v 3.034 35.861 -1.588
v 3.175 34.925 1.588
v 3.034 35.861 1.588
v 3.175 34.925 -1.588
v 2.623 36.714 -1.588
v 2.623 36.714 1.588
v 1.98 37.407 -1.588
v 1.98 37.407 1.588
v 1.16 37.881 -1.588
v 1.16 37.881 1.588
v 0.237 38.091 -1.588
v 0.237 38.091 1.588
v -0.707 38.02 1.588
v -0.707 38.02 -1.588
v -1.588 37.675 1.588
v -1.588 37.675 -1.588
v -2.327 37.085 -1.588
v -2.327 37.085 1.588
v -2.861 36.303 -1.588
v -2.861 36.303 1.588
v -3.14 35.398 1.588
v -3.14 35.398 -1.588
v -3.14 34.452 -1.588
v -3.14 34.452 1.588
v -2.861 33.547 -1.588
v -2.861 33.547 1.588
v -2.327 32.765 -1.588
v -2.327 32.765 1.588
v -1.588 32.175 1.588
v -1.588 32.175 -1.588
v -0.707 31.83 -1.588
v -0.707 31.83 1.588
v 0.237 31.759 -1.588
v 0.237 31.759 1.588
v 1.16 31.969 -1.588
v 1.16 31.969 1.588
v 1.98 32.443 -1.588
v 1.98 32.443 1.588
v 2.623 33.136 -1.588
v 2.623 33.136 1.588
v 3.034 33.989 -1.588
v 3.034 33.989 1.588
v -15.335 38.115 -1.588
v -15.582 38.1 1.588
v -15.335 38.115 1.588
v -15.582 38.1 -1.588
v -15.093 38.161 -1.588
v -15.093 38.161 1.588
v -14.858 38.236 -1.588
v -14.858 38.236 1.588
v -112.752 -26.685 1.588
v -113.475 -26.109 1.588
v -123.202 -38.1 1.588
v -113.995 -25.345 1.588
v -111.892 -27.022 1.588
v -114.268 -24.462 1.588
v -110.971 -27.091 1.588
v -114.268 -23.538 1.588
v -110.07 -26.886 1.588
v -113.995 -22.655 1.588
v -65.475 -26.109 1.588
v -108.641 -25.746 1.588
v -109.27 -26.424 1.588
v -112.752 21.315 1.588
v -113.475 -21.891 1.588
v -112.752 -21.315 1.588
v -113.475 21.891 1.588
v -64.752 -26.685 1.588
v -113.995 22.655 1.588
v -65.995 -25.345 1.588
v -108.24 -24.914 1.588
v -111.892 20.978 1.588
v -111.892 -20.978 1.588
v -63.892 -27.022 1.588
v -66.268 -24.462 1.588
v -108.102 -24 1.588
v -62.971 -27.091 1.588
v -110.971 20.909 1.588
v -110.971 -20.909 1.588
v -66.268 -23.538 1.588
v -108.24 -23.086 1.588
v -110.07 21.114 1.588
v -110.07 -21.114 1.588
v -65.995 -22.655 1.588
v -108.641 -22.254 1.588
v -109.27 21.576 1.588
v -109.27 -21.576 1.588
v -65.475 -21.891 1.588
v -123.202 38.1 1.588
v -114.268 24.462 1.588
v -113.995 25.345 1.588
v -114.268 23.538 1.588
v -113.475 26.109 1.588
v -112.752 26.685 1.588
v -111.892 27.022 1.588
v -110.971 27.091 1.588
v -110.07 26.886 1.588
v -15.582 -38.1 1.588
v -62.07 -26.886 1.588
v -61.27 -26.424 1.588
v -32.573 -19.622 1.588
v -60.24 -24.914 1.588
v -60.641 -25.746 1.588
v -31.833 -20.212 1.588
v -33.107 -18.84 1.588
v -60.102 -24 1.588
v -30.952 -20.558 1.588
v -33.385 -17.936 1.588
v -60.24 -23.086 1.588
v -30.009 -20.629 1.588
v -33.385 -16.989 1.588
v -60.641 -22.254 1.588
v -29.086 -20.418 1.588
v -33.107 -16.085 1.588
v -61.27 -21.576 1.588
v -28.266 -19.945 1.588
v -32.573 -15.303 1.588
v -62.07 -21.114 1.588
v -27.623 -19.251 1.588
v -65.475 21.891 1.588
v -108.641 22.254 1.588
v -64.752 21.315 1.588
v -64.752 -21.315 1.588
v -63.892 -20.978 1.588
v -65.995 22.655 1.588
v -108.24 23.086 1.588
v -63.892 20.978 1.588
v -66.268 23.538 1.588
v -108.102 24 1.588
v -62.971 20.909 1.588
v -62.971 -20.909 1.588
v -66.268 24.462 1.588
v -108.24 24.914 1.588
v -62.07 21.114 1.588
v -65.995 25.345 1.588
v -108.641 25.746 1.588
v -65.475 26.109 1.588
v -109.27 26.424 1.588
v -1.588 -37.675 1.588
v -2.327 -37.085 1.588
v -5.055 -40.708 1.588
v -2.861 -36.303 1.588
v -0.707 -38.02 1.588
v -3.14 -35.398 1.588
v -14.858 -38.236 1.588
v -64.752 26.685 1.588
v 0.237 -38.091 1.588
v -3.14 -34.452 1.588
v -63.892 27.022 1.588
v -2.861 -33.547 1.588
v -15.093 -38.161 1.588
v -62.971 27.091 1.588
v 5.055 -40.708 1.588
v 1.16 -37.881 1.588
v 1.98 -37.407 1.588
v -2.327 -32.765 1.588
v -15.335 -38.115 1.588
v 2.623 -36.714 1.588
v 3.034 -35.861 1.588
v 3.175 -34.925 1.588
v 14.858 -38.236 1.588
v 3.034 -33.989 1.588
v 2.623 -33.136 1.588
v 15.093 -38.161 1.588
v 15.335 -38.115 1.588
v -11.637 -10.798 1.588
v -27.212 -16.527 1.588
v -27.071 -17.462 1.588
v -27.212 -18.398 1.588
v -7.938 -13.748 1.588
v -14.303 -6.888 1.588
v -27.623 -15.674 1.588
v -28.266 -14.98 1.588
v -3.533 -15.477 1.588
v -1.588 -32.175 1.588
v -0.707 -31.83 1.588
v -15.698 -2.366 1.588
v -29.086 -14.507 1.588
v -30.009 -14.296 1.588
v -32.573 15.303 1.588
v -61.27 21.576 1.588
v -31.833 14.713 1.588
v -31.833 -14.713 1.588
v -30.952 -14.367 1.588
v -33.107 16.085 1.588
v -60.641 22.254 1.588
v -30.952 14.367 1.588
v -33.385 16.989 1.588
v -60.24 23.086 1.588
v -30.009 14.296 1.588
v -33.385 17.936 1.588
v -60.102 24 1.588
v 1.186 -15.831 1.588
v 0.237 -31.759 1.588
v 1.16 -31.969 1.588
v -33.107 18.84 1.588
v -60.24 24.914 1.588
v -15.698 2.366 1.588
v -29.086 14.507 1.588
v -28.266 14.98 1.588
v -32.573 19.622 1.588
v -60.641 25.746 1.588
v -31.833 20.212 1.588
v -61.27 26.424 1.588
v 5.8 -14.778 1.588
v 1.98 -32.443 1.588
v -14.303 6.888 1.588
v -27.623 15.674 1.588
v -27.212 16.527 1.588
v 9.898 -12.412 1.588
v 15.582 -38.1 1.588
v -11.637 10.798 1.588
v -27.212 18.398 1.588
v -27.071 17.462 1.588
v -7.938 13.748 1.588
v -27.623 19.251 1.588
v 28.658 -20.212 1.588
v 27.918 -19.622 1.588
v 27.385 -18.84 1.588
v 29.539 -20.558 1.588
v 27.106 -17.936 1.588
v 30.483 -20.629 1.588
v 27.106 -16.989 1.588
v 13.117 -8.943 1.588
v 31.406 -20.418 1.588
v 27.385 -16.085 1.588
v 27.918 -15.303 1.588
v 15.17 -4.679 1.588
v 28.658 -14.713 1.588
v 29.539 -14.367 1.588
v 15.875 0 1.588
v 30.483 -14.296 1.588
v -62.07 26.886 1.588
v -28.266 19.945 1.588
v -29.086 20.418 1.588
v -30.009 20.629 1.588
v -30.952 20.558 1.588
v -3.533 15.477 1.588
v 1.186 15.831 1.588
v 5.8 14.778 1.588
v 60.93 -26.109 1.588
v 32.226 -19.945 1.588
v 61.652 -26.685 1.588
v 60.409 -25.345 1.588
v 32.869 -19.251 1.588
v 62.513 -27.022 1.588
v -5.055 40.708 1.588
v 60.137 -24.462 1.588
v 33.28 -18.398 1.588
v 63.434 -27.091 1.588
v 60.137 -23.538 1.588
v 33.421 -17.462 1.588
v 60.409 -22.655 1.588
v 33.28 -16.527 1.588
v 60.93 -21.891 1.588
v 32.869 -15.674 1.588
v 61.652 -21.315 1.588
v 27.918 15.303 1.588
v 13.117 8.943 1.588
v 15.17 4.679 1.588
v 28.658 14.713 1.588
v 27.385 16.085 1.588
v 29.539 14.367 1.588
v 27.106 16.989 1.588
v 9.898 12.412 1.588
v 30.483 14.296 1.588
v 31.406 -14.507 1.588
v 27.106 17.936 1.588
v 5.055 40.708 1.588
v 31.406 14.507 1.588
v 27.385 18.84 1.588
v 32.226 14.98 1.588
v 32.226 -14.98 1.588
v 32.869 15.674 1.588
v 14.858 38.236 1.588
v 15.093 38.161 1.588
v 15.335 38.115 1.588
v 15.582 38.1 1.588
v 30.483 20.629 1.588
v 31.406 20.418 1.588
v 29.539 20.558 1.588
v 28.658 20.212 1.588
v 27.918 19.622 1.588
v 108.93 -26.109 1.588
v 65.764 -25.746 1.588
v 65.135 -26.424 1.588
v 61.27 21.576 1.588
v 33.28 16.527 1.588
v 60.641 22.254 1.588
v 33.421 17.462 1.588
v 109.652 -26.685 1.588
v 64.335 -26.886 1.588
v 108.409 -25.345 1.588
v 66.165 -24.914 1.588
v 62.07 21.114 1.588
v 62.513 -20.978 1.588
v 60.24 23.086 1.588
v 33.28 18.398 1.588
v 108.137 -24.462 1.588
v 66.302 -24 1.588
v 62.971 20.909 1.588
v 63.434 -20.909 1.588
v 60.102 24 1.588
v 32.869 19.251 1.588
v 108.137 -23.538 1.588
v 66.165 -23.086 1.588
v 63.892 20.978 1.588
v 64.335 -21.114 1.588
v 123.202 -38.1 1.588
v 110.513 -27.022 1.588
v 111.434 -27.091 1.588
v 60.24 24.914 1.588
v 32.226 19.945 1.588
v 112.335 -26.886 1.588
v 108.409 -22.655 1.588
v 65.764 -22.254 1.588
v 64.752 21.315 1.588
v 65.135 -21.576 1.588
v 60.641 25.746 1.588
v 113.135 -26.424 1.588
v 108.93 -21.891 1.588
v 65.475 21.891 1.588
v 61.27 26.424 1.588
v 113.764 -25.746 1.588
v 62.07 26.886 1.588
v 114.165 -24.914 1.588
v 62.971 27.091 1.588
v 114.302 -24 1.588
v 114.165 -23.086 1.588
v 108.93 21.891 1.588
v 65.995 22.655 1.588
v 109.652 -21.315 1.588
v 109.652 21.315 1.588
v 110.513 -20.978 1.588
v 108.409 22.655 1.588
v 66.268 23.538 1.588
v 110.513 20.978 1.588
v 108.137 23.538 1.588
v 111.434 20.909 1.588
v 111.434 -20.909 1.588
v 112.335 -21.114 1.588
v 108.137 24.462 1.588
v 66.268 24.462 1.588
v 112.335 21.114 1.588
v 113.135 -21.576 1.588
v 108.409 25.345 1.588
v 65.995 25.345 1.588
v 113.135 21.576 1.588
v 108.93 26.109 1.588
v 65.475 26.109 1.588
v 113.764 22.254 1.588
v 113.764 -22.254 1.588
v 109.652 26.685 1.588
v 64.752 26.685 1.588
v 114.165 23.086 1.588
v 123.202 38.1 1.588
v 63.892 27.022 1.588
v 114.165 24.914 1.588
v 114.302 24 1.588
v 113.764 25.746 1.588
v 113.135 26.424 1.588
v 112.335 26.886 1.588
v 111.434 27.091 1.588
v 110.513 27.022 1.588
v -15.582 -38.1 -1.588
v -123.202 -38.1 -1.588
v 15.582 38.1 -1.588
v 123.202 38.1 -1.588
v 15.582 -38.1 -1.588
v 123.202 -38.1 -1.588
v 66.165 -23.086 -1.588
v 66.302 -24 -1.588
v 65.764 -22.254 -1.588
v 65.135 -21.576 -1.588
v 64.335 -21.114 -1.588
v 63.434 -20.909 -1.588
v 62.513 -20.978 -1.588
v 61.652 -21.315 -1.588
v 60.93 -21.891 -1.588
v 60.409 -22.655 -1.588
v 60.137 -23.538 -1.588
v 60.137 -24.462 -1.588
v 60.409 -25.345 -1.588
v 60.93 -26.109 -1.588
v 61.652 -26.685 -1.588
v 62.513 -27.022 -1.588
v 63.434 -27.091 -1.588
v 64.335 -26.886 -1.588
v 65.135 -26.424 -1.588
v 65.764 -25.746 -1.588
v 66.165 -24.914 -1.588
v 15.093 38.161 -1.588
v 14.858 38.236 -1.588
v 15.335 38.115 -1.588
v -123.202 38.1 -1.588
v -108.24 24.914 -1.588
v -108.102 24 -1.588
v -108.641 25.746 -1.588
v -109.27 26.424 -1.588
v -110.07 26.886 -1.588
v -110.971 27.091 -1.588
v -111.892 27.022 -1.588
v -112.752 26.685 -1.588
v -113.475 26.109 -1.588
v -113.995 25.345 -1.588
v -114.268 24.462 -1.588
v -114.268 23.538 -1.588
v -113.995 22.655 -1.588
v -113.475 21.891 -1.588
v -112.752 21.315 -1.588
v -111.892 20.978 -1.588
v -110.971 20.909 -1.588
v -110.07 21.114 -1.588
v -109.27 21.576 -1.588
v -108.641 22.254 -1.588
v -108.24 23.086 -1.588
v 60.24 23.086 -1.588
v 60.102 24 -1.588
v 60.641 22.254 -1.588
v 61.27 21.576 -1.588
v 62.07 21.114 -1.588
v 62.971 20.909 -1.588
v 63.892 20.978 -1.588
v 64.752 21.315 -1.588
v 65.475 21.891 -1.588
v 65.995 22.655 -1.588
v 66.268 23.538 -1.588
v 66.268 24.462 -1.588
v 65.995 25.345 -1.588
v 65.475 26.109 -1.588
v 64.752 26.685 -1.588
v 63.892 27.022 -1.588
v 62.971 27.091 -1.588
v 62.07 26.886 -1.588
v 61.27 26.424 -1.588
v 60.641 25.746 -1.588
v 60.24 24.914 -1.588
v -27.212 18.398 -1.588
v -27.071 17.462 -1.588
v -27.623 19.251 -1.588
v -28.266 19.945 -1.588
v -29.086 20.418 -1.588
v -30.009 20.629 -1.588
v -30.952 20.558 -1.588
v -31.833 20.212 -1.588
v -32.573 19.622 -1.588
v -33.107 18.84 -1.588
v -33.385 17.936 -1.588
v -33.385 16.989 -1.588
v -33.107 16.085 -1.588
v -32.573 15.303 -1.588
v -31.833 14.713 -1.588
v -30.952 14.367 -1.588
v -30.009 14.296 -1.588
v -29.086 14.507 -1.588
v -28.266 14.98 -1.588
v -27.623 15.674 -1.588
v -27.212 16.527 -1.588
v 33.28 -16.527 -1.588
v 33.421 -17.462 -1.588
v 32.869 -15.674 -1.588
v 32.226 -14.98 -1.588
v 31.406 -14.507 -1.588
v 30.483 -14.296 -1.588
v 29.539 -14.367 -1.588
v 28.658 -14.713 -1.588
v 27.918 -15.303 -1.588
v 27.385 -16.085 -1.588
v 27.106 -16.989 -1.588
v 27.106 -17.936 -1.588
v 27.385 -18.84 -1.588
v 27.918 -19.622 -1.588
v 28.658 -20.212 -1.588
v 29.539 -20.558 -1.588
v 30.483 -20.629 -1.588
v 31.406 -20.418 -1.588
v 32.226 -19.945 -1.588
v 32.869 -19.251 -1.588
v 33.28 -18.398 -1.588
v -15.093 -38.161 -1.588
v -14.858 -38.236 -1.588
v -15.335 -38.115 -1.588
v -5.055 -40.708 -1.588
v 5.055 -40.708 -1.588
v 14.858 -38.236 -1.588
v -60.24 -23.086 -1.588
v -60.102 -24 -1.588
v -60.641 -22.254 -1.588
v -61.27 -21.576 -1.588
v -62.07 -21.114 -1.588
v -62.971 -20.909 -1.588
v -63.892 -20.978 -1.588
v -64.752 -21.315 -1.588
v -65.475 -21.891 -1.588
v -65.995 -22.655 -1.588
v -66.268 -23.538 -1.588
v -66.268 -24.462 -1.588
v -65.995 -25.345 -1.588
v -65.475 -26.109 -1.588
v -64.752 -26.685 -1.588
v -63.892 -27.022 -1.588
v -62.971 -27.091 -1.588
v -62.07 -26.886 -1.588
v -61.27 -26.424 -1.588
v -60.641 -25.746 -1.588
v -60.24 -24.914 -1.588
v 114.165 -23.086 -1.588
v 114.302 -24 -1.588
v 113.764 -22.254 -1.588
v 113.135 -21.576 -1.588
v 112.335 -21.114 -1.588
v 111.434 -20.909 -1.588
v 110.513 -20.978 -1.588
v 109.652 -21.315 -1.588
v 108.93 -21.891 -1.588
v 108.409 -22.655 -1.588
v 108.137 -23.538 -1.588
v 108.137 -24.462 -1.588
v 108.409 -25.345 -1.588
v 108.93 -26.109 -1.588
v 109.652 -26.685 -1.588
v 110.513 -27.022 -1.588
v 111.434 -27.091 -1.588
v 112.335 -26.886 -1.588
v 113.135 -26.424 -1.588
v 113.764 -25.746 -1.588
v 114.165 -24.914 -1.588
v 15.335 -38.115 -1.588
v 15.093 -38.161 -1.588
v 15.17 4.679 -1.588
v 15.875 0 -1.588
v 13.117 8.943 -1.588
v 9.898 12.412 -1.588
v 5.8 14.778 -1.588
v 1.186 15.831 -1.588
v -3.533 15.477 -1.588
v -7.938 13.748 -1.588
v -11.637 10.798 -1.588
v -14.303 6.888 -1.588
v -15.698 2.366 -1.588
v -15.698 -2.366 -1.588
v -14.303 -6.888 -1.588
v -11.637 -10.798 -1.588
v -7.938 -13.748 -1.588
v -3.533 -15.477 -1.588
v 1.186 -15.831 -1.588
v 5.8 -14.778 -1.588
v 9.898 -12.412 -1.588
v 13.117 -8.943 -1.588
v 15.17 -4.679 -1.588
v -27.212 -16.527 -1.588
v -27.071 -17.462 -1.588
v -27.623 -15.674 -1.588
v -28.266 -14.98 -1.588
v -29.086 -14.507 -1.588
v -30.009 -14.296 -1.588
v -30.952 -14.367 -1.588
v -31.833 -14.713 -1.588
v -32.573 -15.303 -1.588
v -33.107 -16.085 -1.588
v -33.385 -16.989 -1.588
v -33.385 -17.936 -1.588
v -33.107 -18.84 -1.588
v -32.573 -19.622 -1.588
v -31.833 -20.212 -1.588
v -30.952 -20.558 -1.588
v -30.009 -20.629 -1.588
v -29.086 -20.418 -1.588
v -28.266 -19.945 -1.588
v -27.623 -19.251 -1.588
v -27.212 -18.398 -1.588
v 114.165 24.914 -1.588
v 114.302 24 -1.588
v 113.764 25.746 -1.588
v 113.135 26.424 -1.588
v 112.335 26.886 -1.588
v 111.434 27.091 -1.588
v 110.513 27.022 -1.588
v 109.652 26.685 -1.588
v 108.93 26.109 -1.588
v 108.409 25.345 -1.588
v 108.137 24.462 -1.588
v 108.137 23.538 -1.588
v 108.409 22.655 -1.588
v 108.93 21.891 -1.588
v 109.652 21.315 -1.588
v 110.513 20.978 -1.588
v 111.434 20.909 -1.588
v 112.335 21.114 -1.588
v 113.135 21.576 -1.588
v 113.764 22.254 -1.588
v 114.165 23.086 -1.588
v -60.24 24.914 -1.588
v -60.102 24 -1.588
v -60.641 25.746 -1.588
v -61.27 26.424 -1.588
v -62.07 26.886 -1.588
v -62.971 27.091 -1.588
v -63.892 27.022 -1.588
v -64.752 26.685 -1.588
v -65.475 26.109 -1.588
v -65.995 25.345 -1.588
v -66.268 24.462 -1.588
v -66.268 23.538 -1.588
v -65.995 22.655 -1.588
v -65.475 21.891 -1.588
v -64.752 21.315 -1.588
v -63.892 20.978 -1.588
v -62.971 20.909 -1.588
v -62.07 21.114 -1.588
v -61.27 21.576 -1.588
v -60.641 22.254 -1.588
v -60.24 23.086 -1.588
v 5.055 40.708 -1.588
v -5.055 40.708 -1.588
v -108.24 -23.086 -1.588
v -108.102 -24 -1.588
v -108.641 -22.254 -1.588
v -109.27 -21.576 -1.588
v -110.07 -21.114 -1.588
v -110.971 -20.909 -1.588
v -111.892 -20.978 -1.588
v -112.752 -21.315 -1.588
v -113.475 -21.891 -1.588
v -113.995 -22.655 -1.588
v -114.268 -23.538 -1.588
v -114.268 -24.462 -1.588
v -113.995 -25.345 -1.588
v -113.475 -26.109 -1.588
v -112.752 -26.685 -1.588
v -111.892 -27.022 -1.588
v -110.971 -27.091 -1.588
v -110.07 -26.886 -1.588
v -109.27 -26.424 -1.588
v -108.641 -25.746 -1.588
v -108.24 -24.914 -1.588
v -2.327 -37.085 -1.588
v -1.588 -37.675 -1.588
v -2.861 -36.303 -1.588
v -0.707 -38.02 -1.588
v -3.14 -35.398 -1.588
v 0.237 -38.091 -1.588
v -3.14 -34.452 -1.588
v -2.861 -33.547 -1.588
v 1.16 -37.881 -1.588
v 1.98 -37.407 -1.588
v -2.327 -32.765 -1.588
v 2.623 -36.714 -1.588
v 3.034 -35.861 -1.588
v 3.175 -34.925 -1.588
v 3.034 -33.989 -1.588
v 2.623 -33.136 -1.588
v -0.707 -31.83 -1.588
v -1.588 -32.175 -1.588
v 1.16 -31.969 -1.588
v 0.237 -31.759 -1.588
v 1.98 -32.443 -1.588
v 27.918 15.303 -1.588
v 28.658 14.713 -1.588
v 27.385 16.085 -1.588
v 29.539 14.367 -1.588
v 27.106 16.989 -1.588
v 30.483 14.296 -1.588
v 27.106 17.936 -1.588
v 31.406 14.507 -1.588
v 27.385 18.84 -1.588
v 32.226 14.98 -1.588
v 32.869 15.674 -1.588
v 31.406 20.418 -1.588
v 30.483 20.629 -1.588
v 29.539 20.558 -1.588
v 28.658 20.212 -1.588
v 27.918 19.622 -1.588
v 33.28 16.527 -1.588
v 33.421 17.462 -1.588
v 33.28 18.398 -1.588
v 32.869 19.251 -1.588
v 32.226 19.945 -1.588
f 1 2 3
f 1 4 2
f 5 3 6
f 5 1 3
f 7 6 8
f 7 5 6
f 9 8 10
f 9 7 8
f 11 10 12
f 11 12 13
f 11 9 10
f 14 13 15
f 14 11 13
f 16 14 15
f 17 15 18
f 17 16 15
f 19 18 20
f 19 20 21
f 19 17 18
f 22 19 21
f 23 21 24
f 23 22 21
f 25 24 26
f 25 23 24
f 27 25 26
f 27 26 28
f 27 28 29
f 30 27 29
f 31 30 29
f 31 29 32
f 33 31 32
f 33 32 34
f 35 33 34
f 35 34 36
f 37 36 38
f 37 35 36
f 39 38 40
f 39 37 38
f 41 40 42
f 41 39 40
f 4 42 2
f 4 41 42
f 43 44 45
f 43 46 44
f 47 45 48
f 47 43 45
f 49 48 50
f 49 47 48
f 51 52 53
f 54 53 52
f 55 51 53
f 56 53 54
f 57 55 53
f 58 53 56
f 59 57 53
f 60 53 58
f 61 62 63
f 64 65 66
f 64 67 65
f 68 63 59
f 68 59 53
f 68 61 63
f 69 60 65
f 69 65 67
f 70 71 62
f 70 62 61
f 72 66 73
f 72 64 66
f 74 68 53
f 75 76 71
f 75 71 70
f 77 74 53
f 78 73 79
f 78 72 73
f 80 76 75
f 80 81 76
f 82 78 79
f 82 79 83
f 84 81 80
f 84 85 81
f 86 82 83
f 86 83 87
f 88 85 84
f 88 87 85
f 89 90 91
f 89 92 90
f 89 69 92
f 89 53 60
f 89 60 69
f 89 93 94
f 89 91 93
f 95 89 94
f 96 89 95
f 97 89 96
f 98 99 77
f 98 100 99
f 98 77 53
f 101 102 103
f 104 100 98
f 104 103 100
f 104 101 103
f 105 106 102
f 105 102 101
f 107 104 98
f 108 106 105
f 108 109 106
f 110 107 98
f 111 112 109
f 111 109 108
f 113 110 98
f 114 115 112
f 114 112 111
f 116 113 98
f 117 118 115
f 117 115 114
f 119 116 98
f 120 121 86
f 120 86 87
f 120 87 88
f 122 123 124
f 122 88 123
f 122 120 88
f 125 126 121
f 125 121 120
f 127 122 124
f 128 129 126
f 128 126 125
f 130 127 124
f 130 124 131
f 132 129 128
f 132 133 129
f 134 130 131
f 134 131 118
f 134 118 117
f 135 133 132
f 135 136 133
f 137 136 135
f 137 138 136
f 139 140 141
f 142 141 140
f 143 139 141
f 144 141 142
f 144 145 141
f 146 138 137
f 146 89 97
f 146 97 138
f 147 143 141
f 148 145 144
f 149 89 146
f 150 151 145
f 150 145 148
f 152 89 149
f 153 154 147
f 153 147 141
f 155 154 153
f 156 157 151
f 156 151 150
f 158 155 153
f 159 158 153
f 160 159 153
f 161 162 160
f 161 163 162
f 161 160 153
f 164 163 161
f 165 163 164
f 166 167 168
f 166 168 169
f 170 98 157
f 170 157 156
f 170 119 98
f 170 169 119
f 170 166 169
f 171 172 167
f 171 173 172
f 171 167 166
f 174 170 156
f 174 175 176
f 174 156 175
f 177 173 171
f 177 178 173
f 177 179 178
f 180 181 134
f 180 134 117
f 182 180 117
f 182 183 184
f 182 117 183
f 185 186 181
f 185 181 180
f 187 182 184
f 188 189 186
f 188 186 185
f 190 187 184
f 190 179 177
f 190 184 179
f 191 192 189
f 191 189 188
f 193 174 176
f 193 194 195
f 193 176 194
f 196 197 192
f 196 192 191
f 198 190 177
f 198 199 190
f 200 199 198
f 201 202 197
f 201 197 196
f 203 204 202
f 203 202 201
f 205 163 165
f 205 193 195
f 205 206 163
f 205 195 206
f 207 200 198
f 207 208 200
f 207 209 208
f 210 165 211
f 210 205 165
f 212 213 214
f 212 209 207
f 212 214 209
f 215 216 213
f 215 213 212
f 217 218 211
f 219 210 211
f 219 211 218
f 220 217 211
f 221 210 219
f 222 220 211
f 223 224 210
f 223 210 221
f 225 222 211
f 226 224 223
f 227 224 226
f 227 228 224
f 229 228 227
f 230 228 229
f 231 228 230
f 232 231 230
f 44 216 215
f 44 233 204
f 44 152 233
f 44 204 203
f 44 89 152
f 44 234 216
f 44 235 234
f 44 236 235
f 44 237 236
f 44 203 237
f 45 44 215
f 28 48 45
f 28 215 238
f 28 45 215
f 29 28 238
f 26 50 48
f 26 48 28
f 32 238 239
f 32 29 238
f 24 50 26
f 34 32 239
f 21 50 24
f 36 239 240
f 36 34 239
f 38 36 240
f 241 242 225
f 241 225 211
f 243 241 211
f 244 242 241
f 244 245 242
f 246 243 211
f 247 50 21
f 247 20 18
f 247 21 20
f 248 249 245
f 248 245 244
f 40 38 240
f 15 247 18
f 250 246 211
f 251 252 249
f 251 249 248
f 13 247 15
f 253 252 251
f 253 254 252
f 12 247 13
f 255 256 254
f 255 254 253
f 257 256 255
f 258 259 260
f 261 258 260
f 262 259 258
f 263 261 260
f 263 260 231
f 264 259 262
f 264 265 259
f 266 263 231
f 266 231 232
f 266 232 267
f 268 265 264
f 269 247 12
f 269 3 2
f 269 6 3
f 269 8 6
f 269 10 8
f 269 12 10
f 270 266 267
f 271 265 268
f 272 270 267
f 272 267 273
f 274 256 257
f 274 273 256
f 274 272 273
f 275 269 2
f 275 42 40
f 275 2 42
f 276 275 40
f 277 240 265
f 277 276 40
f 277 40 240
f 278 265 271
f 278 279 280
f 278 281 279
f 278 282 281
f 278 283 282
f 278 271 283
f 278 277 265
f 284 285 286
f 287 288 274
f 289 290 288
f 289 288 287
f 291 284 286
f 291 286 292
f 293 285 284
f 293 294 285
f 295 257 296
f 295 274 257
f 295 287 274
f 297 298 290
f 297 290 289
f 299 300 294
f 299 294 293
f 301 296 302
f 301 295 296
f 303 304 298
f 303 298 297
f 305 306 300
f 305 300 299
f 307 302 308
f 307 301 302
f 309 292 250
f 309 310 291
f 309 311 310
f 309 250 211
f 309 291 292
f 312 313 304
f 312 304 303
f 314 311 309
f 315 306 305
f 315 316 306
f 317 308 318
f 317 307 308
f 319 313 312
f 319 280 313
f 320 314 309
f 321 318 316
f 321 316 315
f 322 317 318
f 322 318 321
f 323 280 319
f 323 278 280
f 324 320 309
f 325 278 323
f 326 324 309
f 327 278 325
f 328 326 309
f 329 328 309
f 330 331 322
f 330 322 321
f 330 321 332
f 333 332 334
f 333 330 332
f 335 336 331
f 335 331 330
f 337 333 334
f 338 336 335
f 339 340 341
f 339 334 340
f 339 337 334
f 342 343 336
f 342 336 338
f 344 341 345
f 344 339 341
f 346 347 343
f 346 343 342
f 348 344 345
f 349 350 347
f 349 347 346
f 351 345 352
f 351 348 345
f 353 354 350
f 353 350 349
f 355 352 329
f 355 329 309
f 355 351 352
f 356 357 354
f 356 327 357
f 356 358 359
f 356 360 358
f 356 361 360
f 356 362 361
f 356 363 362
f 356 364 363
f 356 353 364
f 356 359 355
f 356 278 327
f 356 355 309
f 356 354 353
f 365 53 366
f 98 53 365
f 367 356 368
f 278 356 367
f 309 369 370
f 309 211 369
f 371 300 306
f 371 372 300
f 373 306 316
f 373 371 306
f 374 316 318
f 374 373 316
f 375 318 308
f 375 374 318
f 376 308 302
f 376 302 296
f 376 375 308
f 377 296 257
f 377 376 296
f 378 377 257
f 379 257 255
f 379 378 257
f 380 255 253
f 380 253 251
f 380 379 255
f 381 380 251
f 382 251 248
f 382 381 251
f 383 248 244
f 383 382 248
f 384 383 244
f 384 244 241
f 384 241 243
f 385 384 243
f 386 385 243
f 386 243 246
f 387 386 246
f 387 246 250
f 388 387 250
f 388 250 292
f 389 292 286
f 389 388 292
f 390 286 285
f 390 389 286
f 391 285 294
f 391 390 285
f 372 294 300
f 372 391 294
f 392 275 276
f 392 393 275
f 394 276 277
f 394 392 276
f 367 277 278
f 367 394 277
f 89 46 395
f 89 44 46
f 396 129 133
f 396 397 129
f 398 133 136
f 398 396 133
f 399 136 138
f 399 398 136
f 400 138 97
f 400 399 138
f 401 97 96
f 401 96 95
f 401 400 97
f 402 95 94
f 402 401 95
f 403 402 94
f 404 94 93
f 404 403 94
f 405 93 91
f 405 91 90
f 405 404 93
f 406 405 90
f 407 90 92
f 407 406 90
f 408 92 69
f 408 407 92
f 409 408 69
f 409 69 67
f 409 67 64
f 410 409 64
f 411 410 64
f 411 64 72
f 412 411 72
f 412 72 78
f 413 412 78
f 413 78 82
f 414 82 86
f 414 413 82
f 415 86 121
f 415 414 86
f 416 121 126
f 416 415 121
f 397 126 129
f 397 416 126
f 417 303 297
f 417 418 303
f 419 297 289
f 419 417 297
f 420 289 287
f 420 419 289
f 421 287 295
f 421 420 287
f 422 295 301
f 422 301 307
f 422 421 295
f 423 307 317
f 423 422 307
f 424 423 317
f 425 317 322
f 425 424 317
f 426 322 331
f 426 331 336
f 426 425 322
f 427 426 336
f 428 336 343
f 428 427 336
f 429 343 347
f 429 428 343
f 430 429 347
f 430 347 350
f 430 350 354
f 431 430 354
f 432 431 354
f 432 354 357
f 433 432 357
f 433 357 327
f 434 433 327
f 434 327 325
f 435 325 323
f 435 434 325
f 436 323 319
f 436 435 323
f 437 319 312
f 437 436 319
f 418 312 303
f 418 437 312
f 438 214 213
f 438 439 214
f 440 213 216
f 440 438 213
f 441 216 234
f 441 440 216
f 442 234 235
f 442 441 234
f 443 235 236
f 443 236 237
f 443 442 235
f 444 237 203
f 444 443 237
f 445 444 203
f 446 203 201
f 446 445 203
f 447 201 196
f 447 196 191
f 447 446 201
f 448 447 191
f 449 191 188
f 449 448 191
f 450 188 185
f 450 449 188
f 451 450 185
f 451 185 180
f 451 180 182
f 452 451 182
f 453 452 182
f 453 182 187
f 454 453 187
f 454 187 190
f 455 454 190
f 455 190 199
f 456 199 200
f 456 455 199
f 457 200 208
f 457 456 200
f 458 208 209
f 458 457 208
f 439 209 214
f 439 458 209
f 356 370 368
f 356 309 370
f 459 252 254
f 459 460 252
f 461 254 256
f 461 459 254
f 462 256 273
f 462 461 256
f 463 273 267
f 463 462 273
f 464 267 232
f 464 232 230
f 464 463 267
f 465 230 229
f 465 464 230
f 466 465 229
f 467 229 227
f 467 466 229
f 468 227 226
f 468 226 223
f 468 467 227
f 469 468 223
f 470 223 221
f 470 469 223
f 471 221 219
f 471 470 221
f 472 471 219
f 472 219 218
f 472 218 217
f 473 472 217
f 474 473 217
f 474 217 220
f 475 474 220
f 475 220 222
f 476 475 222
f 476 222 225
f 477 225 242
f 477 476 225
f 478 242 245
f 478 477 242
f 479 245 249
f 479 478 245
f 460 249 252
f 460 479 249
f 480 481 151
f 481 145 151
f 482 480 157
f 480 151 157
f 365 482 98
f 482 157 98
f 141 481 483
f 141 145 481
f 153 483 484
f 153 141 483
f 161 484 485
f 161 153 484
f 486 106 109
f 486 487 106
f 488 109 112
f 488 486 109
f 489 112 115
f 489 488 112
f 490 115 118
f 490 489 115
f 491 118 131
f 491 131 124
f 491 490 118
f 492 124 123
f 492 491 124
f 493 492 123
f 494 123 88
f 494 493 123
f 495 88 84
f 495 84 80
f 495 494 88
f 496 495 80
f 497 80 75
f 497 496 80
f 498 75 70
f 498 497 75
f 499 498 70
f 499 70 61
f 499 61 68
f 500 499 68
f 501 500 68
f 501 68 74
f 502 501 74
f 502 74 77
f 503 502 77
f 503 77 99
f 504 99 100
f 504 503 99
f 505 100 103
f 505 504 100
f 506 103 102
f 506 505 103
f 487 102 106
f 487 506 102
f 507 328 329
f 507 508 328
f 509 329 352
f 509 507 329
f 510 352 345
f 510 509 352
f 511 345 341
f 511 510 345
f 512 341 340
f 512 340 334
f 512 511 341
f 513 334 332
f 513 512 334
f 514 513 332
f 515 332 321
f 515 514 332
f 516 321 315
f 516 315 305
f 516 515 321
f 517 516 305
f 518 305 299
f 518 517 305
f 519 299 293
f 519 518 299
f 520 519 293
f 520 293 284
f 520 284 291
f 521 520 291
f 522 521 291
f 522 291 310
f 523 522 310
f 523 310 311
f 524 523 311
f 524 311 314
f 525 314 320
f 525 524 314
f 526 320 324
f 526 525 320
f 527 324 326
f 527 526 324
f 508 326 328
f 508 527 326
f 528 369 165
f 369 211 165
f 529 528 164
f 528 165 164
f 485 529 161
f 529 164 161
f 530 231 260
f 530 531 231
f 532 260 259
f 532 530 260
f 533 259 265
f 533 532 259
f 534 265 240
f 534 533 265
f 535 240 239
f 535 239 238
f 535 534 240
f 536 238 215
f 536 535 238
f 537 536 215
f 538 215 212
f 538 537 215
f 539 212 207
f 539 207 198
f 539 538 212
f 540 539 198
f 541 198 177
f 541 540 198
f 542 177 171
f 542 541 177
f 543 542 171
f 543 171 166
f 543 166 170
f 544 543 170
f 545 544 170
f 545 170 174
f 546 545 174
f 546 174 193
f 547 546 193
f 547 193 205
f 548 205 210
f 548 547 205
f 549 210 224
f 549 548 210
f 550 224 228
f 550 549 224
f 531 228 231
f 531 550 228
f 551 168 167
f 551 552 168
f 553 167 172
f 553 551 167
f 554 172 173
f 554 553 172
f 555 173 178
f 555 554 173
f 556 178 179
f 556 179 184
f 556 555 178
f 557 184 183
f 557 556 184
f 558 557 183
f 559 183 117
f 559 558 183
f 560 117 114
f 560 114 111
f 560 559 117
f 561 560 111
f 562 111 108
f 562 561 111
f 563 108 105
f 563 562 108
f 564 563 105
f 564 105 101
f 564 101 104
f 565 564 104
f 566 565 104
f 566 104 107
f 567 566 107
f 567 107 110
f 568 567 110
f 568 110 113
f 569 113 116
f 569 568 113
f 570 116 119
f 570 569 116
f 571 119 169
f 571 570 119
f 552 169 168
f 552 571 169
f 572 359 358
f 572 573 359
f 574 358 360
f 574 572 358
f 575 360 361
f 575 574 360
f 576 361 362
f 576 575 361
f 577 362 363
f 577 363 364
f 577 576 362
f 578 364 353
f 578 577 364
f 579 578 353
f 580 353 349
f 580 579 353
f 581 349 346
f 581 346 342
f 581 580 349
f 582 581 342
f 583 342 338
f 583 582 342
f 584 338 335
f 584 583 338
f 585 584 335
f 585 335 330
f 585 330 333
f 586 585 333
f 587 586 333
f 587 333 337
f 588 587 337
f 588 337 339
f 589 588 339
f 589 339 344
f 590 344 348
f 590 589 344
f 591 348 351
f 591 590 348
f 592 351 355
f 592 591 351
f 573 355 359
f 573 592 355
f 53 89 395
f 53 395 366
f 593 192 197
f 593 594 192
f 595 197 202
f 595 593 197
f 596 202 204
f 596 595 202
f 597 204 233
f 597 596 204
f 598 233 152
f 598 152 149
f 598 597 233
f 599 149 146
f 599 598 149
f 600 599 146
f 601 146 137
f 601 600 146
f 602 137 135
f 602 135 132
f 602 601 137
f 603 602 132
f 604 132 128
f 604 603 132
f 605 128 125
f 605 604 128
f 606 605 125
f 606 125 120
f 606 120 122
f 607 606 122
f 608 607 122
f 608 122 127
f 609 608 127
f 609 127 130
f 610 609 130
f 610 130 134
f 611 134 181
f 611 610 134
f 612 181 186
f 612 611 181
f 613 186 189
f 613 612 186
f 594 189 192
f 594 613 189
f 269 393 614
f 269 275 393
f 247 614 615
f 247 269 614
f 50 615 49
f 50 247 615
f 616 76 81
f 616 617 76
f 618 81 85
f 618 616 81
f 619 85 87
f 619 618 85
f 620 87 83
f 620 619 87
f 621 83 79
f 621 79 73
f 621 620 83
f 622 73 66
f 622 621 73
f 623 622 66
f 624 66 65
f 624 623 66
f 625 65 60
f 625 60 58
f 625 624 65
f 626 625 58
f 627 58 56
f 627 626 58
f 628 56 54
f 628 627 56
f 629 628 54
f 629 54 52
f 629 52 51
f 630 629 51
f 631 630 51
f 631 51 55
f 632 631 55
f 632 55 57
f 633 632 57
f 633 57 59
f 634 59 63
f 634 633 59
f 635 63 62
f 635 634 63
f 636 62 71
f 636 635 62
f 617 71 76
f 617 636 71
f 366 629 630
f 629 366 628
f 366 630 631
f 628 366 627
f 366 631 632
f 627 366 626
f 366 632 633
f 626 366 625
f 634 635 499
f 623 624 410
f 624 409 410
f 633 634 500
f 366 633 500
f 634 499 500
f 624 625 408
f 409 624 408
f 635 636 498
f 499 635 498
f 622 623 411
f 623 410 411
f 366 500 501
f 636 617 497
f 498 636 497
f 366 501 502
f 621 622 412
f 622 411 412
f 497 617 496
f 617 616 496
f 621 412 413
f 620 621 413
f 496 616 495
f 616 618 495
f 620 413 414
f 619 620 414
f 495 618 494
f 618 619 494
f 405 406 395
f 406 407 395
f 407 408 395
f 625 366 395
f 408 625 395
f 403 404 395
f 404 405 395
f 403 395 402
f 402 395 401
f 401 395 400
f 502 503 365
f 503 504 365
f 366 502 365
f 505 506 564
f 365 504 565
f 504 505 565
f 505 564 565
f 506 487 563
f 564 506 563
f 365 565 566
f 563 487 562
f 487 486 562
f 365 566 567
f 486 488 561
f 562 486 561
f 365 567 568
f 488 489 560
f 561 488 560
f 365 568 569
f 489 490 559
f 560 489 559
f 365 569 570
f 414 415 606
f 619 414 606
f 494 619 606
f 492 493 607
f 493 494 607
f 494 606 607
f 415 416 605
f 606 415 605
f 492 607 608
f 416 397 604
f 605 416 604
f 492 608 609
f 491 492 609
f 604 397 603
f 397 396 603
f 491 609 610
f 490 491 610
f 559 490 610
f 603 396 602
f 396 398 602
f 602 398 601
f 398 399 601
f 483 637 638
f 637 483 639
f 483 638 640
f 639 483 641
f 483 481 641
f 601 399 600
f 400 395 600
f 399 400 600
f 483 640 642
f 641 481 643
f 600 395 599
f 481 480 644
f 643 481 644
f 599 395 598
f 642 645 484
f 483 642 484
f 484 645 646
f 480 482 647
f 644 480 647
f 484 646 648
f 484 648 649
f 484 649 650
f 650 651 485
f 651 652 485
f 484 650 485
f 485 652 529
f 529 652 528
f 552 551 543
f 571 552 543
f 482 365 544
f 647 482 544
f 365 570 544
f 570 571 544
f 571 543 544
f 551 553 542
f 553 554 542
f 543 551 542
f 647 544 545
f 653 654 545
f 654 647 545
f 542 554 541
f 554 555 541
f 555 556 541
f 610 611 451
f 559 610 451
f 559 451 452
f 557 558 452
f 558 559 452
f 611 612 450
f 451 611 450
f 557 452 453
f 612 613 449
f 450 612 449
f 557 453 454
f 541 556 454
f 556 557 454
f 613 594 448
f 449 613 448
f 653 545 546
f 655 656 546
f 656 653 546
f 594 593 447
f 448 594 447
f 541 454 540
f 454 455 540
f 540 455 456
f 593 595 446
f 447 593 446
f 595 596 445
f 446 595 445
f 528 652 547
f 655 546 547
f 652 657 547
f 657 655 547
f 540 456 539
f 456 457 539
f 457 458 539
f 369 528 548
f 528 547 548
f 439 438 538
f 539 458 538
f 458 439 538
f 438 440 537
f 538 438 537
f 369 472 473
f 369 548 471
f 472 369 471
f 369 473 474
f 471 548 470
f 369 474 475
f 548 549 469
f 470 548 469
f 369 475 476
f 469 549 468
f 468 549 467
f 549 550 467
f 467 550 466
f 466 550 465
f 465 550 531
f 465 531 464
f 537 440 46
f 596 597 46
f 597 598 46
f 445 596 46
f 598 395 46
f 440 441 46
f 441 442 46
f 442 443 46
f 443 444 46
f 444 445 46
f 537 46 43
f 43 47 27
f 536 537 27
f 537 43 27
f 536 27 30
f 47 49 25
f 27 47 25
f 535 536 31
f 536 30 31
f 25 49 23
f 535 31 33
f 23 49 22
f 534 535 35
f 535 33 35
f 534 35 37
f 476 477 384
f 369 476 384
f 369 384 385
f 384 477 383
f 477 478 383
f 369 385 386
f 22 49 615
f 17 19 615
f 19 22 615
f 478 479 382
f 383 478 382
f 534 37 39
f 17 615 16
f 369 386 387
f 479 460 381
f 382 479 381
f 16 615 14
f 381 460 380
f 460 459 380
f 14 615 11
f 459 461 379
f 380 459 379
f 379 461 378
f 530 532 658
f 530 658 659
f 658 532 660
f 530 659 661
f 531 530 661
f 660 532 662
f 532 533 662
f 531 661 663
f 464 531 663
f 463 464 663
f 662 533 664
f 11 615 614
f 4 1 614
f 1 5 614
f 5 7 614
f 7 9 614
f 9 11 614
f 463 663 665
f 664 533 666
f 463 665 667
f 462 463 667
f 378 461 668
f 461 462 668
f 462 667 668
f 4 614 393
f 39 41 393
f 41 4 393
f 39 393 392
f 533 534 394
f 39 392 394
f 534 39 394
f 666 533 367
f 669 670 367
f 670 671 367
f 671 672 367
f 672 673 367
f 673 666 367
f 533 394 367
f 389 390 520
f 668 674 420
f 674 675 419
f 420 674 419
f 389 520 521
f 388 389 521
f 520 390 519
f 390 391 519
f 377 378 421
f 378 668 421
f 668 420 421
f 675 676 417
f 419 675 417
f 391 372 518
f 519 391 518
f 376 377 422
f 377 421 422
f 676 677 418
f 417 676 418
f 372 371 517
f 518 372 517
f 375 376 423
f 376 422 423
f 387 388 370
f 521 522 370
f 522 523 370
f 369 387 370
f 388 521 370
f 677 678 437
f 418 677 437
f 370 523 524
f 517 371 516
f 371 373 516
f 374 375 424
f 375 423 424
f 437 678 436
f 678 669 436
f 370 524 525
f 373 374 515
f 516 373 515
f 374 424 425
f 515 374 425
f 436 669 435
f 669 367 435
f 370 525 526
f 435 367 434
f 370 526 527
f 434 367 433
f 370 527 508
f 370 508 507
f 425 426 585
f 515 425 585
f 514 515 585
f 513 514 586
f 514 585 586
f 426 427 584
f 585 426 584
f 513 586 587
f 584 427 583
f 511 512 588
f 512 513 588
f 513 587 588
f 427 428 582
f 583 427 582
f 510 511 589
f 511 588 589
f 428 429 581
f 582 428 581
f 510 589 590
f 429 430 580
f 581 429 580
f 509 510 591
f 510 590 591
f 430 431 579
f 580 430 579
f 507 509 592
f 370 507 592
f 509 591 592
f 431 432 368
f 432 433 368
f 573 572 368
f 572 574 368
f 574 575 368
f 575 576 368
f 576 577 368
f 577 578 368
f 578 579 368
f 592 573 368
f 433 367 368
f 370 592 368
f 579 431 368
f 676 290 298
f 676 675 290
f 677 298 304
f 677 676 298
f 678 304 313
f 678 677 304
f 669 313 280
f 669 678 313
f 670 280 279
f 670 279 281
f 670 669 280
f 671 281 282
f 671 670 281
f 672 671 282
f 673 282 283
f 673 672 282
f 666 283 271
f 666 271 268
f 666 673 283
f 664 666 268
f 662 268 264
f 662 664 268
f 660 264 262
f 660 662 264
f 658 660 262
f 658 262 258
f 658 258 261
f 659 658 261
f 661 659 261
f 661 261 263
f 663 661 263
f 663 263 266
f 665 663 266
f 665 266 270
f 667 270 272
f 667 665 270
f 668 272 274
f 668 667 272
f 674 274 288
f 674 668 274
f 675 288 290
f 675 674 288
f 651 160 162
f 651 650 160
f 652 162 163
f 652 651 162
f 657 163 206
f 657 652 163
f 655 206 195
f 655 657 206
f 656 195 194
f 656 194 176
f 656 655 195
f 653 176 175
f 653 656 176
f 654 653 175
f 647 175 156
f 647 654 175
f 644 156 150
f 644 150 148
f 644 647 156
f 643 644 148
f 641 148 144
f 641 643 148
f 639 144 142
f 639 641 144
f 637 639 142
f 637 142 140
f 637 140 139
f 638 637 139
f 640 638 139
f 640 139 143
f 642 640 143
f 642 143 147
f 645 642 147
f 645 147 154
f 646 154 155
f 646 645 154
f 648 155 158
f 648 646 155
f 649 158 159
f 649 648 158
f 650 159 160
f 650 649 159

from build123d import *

# Parameters (mm, degrees)
SKETCH1_R           = 3.1
SKETCH1_R_2         = 3.175
SKETCH1_R_3         = 15.875
BOSS_EXTRUDE1_DEPTH = 1.5875
FILLET1_R           = 2


with BuildPart() as part:
    # Sketch1 → Boss-Extrude1 (new, symmetric)
    with BuildSketch(Plane.XY):
        with BuildLine():
            Line((-15.202382741, 38.1), (-123.202382741, 38.1))
            Line((-123.202382741, 38.1), (-123.202382741, -38.1))
            Line((-123.202382741, -38.1), (-15.202382741, -38.1))
            ThreePointArc((-15.202382741, -38.1), (0, -41.021), (15.202382741, -38.1))
            Line((15.202382741, -38.1), (123.202382741, -38.1))
            Line((123.202382741, -38.1), (123.202382741, 38.1))
            Line((123.202382741, 38.1), (15.202382741, 38.1))
            ThreePointArc((15.202382741, 38.1), (0, 41.021), (-15.202382741, 38.1))
        make_face()
        with Locations((-111.202382741, 24)):
            Circle(SKETCH1_R, mode=Mode.SUBTRACT)
        with Locations((-63.202382741, 24)):
            Circle(SKETCH1_R, mode=Mode.SUBTRACT)
        with Locations((-63.202382741, -24)):
            Circle(SKETCH1_R, mode=Mode.SUBTRACT)
        with Locations((-111.202382741, -24)):
            Circle(SKETCH1_R, mode=Mode.SUBTRACT)
        with Locations((111.202382741, -24)):
            Circle(SKETCH1_R, mode=Mode.SUBTRACT)
        with Locations((63.202382741, -24)):
            Circle(SKETCH1_R, mode=Mode.SUBTRACT)
        with Locations(Location((63.202382741, 24, 0), (0, 0, 180))):
            Circle(SKETCH1_R, mode=Mode.SUBTRACT)
        with Locations((111.202382741, 24)):
            Circle(SKETCH1_R, mode=Mode.SUBTRACT)
        with Locations((0, 34.925)):
            Circle(SKETCH1_R_2, mode=Mode.SUBTRACT)
        with Locations((30.245937227, 17.4625)):
            Circle(SKETCH1_R_2, mode=Mode.SUBTRACT)
        with Locations((30.245937227, -17.4625)):
            Circle(SKETCH1_R_2, mode=Mode.SUBTRACT)
        with Locations((0, -34.925)):
            Circle(SKETCH1_R_2, mode=Mode.SUBTRACT)
        with Locations((-30.245937227, -17.4625)):
            Circle(SKETCH1_R_2, mode=Mode.SUBTRACT)
        with Locations((-30.245937227, 17.4625)):
            Circle(SKETCH1_R_2, mode=Mode.SUBTRACT)
        Circle(SKETCH1_R_3, mode=Mode.SUBTRACT)
    extrude(amount=BOSS_EXTRUDE1_DEPTH, both=True)

    # Fillet1
    fillet1_edges = [part.edges().sort_by_distance(p)[0] for p in [
        (-15.202382741, 38.1, 0),
        (-15.202382741, -38.1, 0),
        (15.202382741, -38.1, 0),
        (15.202382741, 38.1, 0),
    ]]
    fillet(fillet1_edges, radius=FILLET1_R)


solid = part.part
